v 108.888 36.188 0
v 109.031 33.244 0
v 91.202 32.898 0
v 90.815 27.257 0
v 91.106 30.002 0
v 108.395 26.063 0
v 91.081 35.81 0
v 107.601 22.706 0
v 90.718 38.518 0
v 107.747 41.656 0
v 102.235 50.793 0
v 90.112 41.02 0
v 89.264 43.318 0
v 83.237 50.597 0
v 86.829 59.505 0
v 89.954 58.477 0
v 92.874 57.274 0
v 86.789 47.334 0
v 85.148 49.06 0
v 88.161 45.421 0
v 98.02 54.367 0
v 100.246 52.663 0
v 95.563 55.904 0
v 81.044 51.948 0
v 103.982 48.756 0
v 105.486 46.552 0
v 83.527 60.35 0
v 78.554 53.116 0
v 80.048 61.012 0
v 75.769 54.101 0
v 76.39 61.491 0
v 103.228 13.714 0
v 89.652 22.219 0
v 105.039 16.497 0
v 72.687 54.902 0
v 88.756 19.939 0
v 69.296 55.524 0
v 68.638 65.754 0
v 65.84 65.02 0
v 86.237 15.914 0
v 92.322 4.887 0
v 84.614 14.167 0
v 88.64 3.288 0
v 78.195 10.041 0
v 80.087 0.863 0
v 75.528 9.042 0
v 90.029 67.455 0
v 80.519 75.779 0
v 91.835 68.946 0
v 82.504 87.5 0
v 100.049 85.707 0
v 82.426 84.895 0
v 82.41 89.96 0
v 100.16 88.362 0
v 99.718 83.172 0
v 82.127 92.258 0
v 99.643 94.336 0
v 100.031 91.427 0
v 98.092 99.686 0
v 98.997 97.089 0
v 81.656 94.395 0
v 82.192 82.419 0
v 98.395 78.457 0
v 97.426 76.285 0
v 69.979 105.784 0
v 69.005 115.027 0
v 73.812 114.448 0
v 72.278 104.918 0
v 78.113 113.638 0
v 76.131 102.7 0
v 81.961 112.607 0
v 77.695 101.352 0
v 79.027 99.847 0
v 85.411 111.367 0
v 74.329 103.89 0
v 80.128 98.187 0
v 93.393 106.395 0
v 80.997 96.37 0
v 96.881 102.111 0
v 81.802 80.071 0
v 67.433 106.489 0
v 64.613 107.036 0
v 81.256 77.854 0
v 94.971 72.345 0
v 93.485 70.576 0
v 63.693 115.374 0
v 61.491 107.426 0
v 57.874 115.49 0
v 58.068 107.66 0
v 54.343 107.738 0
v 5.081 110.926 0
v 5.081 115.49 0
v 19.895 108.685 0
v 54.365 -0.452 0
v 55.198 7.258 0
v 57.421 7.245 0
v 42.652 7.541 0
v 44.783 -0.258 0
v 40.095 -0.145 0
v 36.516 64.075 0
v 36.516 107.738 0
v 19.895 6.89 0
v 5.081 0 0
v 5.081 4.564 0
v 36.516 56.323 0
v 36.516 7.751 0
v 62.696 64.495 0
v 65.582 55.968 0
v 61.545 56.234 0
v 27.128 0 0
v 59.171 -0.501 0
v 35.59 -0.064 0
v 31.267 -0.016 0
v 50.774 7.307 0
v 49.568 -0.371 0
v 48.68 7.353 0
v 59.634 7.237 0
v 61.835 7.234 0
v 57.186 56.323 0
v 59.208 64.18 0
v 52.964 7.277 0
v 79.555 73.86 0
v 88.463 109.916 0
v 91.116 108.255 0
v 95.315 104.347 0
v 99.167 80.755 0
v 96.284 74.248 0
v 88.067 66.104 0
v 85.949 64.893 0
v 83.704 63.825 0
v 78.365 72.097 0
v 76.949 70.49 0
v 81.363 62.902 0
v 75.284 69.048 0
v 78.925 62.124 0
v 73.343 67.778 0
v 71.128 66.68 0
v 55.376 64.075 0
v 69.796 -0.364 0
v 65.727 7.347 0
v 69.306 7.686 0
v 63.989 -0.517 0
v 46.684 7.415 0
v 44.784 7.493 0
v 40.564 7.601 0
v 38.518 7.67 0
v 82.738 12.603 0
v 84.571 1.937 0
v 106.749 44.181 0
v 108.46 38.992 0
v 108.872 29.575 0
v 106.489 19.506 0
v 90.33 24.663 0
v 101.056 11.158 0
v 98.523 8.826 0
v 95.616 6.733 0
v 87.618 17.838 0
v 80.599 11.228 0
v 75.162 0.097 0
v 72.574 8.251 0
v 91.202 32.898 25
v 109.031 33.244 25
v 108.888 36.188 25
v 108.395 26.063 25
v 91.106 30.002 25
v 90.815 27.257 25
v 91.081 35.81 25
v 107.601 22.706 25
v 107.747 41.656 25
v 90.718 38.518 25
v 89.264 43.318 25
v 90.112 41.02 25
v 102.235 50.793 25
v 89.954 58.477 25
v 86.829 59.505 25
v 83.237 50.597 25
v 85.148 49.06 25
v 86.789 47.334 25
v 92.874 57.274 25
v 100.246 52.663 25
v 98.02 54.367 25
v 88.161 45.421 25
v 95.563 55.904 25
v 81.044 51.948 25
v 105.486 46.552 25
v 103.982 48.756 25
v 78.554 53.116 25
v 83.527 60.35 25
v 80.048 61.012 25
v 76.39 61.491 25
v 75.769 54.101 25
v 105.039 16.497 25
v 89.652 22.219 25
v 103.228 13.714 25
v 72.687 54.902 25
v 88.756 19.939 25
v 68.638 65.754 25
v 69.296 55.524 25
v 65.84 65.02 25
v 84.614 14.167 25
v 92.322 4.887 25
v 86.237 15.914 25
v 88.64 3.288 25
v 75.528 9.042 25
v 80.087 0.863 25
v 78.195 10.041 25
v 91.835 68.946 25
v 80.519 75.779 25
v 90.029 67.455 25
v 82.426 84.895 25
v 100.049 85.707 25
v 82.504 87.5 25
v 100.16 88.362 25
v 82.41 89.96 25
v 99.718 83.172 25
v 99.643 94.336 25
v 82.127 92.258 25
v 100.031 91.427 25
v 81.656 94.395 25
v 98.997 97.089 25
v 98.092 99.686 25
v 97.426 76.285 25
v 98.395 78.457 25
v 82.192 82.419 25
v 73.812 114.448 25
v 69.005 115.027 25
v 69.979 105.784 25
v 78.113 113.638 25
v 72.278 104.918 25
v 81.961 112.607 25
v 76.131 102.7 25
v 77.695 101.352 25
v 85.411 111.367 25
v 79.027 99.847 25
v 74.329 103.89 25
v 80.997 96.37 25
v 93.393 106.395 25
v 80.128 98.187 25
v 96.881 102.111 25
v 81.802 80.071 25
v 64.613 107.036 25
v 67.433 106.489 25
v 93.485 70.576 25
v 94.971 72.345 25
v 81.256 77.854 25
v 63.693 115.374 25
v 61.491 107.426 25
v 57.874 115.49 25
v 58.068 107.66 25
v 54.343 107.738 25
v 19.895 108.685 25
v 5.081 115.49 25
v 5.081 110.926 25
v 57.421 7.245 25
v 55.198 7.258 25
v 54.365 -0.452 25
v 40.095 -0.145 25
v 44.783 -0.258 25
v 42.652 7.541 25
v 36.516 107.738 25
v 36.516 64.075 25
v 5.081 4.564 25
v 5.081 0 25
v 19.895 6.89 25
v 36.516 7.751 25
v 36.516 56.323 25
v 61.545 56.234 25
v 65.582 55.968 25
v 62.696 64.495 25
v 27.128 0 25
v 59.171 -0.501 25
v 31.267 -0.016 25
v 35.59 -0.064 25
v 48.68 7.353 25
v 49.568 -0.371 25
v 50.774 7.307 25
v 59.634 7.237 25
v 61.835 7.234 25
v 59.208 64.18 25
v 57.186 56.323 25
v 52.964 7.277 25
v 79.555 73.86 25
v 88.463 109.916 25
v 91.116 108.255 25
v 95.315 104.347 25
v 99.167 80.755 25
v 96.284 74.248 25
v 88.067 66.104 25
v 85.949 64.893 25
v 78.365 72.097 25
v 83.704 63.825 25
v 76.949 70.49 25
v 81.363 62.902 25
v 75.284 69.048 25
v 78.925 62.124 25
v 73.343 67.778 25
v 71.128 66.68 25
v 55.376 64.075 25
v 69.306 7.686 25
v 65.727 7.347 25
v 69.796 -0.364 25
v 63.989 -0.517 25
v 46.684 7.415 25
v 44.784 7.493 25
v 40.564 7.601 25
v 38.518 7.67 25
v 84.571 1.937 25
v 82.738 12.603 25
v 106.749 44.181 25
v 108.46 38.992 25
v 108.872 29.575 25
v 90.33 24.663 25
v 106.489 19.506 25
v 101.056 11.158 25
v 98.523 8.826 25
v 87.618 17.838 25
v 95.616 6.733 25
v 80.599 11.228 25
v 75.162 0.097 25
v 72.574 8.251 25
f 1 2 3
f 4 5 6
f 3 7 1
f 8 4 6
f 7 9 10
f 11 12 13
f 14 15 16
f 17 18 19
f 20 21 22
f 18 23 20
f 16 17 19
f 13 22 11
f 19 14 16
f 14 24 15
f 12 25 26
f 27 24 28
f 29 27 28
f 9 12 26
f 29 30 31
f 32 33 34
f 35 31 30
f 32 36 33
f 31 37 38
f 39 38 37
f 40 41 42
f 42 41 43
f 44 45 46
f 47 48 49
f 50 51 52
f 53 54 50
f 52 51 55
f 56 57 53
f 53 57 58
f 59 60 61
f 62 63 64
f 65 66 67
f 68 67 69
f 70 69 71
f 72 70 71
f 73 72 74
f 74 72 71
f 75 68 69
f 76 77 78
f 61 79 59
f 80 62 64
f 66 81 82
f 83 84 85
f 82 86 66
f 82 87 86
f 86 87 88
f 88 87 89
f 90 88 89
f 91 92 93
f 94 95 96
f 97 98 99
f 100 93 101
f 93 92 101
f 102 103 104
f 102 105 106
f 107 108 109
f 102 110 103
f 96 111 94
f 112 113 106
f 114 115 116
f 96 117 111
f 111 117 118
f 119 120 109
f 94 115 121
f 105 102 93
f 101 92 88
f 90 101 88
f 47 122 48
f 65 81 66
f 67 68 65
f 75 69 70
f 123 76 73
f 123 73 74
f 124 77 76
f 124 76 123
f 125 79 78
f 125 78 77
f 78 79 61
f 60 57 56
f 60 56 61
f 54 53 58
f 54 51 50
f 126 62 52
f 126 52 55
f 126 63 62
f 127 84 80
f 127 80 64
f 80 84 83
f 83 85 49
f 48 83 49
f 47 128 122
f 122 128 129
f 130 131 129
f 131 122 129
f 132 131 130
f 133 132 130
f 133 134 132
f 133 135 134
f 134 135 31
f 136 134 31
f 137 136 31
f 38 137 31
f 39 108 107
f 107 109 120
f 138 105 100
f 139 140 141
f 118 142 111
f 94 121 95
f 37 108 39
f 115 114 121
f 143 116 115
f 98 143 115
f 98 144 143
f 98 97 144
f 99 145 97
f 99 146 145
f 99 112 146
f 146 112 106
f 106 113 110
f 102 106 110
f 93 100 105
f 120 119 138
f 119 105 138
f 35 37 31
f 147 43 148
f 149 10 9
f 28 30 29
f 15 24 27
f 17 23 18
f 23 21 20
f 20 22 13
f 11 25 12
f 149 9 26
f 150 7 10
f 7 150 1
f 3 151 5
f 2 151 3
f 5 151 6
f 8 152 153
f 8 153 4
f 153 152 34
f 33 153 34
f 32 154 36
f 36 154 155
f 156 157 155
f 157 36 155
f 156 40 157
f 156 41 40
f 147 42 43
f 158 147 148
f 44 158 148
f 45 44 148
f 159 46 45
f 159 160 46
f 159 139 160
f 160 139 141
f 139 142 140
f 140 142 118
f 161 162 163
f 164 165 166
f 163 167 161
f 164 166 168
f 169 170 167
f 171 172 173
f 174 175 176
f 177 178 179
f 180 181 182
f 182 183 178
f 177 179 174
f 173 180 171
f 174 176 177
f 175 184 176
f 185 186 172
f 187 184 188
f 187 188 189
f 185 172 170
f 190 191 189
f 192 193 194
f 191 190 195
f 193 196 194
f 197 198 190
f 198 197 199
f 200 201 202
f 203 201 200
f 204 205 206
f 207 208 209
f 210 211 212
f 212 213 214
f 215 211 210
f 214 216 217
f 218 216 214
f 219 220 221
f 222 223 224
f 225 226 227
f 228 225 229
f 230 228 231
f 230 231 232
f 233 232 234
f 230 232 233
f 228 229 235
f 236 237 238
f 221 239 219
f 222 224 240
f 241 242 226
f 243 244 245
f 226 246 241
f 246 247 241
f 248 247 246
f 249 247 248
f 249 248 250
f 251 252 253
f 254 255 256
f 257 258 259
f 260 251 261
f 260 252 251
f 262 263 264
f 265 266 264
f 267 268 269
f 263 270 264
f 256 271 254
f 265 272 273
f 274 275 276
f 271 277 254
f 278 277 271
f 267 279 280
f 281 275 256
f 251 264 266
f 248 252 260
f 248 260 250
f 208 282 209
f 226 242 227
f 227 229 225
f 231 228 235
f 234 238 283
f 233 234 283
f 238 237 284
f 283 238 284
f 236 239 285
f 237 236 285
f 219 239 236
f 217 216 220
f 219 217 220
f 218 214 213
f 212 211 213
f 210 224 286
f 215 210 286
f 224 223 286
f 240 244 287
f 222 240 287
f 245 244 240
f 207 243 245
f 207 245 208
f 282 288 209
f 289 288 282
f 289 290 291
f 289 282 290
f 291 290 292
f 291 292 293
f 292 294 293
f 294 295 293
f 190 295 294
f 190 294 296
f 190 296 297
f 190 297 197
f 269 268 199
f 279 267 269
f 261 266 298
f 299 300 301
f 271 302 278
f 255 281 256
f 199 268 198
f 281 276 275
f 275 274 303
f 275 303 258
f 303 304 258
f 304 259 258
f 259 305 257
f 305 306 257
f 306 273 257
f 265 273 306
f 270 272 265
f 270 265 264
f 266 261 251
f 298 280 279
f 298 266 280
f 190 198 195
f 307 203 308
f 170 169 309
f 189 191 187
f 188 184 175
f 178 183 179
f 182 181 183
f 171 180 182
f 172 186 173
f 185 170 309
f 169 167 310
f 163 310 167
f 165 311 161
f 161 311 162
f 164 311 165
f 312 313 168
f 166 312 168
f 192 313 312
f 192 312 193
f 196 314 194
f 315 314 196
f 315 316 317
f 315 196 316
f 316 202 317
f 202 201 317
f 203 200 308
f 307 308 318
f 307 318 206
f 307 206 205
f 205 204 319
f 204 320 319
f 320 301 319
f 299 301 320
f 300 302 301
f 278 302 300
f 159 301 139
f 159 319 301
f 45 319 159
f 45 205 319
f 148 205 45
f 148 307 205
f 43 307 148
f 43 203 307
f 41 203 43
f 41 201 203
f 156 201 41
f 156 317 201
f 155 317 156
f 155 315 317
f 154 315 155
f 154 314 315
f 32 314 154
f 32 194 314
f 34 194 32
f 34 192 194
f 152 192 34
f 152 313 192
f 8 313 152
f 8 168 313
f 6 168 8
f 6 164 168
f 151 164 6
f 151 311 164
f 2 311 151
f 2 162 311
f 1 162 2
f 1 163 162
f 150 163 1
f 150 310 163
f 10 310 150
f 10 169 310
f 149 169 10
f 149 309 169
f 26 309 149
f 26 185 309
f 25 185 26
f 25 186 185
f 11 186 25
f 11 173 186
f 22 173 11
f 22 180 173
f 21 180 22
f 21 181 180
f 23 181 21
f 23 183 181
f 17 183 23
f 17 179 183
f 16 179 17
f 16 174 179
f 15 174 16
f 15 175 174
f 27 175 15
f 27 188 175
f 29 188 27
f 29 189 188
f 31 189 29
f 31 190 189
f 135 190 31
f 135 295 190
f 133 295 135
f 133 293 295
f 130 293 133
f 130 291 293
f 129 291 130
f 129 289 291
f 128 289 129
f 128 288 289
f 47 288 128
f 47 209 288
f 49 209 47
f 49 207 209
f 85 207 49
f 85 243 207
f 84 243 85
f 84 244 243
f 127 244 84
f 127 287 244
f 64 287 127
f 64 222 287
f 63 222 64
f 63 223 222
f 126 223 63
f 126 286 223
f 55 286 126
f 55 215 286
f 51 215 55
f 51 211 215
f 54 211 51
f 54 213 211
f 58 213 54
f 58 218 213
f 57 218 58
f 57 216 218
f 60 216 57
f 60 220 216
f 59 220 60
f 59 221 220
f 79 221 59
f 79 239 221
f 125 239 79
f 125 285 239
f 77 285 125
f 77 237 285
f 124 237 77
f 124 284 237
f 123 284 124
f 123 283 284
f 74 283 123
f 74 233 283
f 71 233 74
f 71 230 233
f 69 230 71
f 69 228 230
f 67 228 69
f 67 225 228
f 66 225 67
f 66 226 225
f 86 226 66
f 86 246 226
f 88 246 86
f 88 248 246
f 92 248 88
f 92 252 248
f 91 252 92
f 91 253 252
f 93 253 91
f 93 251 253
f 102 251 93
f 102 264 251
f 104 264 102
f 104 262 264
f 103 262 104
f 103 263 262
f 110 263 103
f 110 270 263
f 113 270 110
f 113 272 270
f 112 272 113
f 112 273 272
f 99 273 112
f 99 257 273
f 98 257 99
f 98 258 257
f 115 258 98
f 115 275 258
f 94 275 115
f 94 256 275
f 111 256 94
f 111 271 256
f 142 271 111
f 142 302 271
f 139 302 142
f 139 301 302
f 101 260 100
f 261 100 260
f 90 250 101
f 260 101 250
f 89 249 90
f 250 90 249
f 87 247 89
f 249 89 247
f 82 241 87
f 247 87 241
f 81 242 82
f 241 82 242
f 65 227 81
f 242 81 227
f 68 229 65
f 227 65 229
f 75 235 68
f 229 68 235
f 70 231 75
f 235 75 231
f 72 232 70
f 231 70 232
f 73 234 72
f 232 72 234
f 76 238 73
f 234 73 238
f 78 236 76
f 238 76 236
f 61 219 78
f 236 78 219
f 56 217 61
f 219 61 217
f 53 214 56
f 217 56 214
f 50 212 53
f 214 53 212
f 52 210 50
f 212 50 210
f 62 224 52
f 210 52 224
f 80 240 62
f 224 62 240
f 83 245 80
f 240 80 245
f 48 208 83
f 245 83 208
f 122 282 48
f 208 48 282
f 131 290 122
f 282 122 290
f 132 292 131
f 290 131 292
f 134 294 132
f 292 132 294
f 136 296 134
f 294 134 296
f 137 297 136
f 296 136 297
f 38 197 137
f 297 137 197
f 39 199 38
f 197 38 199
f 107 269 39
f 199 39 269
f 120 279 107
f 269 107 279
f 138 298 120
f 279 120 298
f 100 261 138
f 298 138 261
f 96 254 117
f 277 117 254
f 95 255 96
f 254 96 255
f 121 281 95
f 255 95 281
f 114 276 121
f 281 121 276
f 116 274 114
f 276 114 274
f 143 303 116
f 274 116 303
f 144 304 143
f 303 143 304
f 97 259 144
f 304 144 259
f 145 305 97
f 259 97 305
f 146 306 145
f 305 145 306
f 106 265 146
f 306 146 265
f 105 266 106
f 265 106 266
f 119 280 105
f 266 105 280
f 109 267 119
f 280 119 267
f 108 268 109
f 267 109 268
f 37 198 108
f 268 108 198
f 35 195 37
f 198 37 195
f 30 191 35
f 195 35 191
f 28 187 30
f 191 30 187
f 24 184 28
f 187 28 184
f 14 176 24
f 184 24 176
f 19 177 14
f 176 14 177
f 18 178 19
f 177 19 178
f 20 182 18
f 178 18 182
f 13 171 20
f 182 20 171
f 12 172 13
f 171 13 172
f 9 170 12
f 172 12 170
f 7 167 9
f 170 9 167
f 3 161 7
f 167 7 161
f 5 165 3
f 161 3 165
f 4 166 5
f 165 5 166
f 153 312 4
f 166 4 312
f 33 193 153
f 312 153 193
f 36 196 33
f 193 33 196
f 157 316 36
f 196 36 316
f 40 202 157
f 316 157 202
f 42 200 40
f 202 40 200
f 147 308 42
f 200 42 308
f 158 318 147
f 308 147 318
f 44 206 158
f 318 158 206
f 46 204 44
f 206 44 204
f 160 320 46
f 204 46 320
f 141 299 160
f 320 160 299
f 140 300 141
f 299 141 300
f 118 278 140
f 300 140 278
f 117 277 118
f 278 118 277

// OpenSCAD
block_xy_size=127;
block_z=25;

linear_extrude(height = block_z)
text("B", font = "Times New Roman", size=block_xy_size);
